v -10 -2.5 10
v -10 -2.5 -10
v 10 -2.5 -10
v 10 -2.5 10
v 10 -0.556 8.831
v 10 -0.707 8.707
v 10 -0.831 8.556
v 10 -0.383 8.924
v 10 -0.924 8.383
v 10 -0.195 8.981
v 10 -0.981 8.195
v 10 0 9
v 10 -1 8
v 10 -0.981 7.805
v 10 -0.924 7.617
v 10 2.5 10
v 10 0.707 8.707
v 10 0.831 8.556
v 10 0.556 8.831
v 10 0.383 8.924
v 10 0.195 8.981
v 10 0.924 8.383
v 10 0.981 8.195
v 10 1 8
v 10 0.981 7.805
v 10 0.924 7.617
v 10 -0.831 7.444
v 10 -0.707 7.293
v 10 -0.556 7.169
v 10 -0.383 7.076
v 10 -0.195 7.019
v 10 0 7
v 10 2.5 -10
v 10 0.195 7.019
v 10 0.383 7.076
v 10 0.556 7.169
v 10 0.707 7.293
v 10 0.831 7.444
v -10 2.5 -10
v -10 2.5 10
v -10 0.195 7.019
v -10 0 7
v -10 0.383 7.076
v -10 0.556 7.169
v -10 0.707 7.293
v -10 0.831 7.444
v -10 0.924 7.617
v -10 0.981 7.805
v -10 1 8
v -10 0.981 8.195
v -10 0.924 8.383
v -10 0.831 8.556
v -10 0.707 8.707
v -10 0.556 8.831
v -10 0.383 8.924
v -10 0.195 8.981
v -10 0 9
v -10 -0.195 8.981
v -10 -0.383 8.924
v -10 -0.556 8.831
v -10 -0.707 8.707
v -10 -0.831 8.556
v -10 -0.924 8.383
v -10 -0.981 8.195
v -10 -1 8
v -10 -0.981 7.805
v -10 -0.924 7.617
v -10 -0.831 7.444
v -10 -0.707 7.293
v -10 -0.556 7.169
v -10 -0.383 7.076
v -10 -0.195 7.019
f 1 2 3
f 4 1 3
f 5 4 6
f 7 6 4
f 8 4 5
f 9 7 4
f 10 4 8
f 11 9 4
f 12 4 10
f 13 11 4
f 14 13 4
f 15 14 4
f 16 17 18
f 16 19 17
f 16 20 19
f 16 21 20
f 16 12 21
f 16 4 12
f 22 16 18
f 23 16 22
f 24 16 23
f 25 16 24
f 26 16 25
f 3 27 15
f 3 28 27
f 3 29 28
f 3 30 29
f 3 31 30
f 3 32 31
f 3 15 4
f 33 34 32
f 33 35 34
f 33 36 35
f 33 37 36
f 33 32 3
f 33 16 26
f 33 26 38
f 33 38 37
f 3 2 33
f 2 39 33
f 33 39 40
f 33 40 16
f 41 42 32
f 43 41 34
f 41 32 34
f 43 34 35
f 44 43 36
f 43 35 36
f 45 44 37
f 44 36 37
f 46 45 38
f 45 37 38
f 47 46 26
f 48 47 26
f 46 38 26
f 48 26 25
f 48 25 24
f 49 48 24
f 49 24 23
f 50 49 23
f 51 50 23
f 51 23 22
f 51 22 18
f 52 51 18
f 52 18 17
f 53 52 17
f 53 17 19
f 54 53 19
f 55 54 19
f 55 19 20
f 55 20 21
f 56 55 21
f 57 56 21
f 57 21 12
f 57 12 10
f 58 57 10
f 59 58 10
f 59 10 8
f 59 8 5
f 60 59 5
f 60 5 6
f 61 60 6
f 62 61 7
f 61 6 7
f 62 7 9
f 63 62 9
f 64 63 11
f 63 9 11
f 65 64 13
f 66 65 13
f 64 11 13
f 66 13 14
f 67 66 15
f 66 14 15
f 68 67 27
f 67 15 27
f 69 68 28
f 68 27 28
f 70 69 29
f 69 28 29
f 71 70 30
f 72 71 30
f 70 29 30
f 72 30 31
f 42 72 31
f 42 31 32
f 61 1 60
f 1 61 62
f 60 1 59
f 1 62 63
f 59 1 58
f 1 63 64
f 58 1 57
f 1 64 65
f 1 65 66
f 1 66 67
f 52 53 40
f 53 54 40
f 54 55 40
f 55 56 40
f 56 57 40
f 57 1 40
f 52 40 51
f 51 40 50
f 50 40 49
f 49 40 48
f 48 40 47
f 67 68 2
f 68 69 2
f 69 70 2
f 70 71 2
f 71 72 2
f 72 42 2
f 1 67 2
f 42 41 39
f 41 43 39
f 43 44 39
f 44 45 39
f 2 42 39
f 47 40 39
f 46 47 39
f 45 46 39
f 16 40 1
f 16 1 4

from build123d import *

# Parameters (mm, degrees)
SKETCH1_W           = 20
SKETCH1_H           = 20
BOSS_EXTRUDE1_DEPTH = 2.5
CUT_EXTRUDE1_REACH  = 24.5
SKETCH2_R           = 1


with BuildPart() as part:
    # Sketch1 → Boss-Extrude1 (new, symmetric)
    with BuildSketch(Plane(origin=(0, 0, 0), x_dir=(1, 0, 0), z_dir=(0, 1, 0))):
        Rectangle(SKETCH1_W, SKETCH1_H)
    extrude(amount=BOSS_EXTRUDE1_DEPTH, both=True)

    # Sketch2 → Cut-Extrude1 (cut, up to next)
    with BuildSketch(Plane(origin=(10, 0, 0), x_dir=(0, 0, -1), z_dir=(1, 0, 0)), mode=Mode.PRIVATE) as cut_extrude1_sk1:
        with Locations((-8, 0)):
            Circle(SKETCH2_R)
    cut_extrude1_tool1 = extrude(cut_extrude1_sk1.sketch, amount=-CUT_EXTRUDE1_REACH, mode=Mode.PRIVATE) & part.part
    add(cut_extrude1_tool1.solids().sort_by_distance((10, 0, 8))[0], mode=Mode.SUBTRACT)


solid = part.part
